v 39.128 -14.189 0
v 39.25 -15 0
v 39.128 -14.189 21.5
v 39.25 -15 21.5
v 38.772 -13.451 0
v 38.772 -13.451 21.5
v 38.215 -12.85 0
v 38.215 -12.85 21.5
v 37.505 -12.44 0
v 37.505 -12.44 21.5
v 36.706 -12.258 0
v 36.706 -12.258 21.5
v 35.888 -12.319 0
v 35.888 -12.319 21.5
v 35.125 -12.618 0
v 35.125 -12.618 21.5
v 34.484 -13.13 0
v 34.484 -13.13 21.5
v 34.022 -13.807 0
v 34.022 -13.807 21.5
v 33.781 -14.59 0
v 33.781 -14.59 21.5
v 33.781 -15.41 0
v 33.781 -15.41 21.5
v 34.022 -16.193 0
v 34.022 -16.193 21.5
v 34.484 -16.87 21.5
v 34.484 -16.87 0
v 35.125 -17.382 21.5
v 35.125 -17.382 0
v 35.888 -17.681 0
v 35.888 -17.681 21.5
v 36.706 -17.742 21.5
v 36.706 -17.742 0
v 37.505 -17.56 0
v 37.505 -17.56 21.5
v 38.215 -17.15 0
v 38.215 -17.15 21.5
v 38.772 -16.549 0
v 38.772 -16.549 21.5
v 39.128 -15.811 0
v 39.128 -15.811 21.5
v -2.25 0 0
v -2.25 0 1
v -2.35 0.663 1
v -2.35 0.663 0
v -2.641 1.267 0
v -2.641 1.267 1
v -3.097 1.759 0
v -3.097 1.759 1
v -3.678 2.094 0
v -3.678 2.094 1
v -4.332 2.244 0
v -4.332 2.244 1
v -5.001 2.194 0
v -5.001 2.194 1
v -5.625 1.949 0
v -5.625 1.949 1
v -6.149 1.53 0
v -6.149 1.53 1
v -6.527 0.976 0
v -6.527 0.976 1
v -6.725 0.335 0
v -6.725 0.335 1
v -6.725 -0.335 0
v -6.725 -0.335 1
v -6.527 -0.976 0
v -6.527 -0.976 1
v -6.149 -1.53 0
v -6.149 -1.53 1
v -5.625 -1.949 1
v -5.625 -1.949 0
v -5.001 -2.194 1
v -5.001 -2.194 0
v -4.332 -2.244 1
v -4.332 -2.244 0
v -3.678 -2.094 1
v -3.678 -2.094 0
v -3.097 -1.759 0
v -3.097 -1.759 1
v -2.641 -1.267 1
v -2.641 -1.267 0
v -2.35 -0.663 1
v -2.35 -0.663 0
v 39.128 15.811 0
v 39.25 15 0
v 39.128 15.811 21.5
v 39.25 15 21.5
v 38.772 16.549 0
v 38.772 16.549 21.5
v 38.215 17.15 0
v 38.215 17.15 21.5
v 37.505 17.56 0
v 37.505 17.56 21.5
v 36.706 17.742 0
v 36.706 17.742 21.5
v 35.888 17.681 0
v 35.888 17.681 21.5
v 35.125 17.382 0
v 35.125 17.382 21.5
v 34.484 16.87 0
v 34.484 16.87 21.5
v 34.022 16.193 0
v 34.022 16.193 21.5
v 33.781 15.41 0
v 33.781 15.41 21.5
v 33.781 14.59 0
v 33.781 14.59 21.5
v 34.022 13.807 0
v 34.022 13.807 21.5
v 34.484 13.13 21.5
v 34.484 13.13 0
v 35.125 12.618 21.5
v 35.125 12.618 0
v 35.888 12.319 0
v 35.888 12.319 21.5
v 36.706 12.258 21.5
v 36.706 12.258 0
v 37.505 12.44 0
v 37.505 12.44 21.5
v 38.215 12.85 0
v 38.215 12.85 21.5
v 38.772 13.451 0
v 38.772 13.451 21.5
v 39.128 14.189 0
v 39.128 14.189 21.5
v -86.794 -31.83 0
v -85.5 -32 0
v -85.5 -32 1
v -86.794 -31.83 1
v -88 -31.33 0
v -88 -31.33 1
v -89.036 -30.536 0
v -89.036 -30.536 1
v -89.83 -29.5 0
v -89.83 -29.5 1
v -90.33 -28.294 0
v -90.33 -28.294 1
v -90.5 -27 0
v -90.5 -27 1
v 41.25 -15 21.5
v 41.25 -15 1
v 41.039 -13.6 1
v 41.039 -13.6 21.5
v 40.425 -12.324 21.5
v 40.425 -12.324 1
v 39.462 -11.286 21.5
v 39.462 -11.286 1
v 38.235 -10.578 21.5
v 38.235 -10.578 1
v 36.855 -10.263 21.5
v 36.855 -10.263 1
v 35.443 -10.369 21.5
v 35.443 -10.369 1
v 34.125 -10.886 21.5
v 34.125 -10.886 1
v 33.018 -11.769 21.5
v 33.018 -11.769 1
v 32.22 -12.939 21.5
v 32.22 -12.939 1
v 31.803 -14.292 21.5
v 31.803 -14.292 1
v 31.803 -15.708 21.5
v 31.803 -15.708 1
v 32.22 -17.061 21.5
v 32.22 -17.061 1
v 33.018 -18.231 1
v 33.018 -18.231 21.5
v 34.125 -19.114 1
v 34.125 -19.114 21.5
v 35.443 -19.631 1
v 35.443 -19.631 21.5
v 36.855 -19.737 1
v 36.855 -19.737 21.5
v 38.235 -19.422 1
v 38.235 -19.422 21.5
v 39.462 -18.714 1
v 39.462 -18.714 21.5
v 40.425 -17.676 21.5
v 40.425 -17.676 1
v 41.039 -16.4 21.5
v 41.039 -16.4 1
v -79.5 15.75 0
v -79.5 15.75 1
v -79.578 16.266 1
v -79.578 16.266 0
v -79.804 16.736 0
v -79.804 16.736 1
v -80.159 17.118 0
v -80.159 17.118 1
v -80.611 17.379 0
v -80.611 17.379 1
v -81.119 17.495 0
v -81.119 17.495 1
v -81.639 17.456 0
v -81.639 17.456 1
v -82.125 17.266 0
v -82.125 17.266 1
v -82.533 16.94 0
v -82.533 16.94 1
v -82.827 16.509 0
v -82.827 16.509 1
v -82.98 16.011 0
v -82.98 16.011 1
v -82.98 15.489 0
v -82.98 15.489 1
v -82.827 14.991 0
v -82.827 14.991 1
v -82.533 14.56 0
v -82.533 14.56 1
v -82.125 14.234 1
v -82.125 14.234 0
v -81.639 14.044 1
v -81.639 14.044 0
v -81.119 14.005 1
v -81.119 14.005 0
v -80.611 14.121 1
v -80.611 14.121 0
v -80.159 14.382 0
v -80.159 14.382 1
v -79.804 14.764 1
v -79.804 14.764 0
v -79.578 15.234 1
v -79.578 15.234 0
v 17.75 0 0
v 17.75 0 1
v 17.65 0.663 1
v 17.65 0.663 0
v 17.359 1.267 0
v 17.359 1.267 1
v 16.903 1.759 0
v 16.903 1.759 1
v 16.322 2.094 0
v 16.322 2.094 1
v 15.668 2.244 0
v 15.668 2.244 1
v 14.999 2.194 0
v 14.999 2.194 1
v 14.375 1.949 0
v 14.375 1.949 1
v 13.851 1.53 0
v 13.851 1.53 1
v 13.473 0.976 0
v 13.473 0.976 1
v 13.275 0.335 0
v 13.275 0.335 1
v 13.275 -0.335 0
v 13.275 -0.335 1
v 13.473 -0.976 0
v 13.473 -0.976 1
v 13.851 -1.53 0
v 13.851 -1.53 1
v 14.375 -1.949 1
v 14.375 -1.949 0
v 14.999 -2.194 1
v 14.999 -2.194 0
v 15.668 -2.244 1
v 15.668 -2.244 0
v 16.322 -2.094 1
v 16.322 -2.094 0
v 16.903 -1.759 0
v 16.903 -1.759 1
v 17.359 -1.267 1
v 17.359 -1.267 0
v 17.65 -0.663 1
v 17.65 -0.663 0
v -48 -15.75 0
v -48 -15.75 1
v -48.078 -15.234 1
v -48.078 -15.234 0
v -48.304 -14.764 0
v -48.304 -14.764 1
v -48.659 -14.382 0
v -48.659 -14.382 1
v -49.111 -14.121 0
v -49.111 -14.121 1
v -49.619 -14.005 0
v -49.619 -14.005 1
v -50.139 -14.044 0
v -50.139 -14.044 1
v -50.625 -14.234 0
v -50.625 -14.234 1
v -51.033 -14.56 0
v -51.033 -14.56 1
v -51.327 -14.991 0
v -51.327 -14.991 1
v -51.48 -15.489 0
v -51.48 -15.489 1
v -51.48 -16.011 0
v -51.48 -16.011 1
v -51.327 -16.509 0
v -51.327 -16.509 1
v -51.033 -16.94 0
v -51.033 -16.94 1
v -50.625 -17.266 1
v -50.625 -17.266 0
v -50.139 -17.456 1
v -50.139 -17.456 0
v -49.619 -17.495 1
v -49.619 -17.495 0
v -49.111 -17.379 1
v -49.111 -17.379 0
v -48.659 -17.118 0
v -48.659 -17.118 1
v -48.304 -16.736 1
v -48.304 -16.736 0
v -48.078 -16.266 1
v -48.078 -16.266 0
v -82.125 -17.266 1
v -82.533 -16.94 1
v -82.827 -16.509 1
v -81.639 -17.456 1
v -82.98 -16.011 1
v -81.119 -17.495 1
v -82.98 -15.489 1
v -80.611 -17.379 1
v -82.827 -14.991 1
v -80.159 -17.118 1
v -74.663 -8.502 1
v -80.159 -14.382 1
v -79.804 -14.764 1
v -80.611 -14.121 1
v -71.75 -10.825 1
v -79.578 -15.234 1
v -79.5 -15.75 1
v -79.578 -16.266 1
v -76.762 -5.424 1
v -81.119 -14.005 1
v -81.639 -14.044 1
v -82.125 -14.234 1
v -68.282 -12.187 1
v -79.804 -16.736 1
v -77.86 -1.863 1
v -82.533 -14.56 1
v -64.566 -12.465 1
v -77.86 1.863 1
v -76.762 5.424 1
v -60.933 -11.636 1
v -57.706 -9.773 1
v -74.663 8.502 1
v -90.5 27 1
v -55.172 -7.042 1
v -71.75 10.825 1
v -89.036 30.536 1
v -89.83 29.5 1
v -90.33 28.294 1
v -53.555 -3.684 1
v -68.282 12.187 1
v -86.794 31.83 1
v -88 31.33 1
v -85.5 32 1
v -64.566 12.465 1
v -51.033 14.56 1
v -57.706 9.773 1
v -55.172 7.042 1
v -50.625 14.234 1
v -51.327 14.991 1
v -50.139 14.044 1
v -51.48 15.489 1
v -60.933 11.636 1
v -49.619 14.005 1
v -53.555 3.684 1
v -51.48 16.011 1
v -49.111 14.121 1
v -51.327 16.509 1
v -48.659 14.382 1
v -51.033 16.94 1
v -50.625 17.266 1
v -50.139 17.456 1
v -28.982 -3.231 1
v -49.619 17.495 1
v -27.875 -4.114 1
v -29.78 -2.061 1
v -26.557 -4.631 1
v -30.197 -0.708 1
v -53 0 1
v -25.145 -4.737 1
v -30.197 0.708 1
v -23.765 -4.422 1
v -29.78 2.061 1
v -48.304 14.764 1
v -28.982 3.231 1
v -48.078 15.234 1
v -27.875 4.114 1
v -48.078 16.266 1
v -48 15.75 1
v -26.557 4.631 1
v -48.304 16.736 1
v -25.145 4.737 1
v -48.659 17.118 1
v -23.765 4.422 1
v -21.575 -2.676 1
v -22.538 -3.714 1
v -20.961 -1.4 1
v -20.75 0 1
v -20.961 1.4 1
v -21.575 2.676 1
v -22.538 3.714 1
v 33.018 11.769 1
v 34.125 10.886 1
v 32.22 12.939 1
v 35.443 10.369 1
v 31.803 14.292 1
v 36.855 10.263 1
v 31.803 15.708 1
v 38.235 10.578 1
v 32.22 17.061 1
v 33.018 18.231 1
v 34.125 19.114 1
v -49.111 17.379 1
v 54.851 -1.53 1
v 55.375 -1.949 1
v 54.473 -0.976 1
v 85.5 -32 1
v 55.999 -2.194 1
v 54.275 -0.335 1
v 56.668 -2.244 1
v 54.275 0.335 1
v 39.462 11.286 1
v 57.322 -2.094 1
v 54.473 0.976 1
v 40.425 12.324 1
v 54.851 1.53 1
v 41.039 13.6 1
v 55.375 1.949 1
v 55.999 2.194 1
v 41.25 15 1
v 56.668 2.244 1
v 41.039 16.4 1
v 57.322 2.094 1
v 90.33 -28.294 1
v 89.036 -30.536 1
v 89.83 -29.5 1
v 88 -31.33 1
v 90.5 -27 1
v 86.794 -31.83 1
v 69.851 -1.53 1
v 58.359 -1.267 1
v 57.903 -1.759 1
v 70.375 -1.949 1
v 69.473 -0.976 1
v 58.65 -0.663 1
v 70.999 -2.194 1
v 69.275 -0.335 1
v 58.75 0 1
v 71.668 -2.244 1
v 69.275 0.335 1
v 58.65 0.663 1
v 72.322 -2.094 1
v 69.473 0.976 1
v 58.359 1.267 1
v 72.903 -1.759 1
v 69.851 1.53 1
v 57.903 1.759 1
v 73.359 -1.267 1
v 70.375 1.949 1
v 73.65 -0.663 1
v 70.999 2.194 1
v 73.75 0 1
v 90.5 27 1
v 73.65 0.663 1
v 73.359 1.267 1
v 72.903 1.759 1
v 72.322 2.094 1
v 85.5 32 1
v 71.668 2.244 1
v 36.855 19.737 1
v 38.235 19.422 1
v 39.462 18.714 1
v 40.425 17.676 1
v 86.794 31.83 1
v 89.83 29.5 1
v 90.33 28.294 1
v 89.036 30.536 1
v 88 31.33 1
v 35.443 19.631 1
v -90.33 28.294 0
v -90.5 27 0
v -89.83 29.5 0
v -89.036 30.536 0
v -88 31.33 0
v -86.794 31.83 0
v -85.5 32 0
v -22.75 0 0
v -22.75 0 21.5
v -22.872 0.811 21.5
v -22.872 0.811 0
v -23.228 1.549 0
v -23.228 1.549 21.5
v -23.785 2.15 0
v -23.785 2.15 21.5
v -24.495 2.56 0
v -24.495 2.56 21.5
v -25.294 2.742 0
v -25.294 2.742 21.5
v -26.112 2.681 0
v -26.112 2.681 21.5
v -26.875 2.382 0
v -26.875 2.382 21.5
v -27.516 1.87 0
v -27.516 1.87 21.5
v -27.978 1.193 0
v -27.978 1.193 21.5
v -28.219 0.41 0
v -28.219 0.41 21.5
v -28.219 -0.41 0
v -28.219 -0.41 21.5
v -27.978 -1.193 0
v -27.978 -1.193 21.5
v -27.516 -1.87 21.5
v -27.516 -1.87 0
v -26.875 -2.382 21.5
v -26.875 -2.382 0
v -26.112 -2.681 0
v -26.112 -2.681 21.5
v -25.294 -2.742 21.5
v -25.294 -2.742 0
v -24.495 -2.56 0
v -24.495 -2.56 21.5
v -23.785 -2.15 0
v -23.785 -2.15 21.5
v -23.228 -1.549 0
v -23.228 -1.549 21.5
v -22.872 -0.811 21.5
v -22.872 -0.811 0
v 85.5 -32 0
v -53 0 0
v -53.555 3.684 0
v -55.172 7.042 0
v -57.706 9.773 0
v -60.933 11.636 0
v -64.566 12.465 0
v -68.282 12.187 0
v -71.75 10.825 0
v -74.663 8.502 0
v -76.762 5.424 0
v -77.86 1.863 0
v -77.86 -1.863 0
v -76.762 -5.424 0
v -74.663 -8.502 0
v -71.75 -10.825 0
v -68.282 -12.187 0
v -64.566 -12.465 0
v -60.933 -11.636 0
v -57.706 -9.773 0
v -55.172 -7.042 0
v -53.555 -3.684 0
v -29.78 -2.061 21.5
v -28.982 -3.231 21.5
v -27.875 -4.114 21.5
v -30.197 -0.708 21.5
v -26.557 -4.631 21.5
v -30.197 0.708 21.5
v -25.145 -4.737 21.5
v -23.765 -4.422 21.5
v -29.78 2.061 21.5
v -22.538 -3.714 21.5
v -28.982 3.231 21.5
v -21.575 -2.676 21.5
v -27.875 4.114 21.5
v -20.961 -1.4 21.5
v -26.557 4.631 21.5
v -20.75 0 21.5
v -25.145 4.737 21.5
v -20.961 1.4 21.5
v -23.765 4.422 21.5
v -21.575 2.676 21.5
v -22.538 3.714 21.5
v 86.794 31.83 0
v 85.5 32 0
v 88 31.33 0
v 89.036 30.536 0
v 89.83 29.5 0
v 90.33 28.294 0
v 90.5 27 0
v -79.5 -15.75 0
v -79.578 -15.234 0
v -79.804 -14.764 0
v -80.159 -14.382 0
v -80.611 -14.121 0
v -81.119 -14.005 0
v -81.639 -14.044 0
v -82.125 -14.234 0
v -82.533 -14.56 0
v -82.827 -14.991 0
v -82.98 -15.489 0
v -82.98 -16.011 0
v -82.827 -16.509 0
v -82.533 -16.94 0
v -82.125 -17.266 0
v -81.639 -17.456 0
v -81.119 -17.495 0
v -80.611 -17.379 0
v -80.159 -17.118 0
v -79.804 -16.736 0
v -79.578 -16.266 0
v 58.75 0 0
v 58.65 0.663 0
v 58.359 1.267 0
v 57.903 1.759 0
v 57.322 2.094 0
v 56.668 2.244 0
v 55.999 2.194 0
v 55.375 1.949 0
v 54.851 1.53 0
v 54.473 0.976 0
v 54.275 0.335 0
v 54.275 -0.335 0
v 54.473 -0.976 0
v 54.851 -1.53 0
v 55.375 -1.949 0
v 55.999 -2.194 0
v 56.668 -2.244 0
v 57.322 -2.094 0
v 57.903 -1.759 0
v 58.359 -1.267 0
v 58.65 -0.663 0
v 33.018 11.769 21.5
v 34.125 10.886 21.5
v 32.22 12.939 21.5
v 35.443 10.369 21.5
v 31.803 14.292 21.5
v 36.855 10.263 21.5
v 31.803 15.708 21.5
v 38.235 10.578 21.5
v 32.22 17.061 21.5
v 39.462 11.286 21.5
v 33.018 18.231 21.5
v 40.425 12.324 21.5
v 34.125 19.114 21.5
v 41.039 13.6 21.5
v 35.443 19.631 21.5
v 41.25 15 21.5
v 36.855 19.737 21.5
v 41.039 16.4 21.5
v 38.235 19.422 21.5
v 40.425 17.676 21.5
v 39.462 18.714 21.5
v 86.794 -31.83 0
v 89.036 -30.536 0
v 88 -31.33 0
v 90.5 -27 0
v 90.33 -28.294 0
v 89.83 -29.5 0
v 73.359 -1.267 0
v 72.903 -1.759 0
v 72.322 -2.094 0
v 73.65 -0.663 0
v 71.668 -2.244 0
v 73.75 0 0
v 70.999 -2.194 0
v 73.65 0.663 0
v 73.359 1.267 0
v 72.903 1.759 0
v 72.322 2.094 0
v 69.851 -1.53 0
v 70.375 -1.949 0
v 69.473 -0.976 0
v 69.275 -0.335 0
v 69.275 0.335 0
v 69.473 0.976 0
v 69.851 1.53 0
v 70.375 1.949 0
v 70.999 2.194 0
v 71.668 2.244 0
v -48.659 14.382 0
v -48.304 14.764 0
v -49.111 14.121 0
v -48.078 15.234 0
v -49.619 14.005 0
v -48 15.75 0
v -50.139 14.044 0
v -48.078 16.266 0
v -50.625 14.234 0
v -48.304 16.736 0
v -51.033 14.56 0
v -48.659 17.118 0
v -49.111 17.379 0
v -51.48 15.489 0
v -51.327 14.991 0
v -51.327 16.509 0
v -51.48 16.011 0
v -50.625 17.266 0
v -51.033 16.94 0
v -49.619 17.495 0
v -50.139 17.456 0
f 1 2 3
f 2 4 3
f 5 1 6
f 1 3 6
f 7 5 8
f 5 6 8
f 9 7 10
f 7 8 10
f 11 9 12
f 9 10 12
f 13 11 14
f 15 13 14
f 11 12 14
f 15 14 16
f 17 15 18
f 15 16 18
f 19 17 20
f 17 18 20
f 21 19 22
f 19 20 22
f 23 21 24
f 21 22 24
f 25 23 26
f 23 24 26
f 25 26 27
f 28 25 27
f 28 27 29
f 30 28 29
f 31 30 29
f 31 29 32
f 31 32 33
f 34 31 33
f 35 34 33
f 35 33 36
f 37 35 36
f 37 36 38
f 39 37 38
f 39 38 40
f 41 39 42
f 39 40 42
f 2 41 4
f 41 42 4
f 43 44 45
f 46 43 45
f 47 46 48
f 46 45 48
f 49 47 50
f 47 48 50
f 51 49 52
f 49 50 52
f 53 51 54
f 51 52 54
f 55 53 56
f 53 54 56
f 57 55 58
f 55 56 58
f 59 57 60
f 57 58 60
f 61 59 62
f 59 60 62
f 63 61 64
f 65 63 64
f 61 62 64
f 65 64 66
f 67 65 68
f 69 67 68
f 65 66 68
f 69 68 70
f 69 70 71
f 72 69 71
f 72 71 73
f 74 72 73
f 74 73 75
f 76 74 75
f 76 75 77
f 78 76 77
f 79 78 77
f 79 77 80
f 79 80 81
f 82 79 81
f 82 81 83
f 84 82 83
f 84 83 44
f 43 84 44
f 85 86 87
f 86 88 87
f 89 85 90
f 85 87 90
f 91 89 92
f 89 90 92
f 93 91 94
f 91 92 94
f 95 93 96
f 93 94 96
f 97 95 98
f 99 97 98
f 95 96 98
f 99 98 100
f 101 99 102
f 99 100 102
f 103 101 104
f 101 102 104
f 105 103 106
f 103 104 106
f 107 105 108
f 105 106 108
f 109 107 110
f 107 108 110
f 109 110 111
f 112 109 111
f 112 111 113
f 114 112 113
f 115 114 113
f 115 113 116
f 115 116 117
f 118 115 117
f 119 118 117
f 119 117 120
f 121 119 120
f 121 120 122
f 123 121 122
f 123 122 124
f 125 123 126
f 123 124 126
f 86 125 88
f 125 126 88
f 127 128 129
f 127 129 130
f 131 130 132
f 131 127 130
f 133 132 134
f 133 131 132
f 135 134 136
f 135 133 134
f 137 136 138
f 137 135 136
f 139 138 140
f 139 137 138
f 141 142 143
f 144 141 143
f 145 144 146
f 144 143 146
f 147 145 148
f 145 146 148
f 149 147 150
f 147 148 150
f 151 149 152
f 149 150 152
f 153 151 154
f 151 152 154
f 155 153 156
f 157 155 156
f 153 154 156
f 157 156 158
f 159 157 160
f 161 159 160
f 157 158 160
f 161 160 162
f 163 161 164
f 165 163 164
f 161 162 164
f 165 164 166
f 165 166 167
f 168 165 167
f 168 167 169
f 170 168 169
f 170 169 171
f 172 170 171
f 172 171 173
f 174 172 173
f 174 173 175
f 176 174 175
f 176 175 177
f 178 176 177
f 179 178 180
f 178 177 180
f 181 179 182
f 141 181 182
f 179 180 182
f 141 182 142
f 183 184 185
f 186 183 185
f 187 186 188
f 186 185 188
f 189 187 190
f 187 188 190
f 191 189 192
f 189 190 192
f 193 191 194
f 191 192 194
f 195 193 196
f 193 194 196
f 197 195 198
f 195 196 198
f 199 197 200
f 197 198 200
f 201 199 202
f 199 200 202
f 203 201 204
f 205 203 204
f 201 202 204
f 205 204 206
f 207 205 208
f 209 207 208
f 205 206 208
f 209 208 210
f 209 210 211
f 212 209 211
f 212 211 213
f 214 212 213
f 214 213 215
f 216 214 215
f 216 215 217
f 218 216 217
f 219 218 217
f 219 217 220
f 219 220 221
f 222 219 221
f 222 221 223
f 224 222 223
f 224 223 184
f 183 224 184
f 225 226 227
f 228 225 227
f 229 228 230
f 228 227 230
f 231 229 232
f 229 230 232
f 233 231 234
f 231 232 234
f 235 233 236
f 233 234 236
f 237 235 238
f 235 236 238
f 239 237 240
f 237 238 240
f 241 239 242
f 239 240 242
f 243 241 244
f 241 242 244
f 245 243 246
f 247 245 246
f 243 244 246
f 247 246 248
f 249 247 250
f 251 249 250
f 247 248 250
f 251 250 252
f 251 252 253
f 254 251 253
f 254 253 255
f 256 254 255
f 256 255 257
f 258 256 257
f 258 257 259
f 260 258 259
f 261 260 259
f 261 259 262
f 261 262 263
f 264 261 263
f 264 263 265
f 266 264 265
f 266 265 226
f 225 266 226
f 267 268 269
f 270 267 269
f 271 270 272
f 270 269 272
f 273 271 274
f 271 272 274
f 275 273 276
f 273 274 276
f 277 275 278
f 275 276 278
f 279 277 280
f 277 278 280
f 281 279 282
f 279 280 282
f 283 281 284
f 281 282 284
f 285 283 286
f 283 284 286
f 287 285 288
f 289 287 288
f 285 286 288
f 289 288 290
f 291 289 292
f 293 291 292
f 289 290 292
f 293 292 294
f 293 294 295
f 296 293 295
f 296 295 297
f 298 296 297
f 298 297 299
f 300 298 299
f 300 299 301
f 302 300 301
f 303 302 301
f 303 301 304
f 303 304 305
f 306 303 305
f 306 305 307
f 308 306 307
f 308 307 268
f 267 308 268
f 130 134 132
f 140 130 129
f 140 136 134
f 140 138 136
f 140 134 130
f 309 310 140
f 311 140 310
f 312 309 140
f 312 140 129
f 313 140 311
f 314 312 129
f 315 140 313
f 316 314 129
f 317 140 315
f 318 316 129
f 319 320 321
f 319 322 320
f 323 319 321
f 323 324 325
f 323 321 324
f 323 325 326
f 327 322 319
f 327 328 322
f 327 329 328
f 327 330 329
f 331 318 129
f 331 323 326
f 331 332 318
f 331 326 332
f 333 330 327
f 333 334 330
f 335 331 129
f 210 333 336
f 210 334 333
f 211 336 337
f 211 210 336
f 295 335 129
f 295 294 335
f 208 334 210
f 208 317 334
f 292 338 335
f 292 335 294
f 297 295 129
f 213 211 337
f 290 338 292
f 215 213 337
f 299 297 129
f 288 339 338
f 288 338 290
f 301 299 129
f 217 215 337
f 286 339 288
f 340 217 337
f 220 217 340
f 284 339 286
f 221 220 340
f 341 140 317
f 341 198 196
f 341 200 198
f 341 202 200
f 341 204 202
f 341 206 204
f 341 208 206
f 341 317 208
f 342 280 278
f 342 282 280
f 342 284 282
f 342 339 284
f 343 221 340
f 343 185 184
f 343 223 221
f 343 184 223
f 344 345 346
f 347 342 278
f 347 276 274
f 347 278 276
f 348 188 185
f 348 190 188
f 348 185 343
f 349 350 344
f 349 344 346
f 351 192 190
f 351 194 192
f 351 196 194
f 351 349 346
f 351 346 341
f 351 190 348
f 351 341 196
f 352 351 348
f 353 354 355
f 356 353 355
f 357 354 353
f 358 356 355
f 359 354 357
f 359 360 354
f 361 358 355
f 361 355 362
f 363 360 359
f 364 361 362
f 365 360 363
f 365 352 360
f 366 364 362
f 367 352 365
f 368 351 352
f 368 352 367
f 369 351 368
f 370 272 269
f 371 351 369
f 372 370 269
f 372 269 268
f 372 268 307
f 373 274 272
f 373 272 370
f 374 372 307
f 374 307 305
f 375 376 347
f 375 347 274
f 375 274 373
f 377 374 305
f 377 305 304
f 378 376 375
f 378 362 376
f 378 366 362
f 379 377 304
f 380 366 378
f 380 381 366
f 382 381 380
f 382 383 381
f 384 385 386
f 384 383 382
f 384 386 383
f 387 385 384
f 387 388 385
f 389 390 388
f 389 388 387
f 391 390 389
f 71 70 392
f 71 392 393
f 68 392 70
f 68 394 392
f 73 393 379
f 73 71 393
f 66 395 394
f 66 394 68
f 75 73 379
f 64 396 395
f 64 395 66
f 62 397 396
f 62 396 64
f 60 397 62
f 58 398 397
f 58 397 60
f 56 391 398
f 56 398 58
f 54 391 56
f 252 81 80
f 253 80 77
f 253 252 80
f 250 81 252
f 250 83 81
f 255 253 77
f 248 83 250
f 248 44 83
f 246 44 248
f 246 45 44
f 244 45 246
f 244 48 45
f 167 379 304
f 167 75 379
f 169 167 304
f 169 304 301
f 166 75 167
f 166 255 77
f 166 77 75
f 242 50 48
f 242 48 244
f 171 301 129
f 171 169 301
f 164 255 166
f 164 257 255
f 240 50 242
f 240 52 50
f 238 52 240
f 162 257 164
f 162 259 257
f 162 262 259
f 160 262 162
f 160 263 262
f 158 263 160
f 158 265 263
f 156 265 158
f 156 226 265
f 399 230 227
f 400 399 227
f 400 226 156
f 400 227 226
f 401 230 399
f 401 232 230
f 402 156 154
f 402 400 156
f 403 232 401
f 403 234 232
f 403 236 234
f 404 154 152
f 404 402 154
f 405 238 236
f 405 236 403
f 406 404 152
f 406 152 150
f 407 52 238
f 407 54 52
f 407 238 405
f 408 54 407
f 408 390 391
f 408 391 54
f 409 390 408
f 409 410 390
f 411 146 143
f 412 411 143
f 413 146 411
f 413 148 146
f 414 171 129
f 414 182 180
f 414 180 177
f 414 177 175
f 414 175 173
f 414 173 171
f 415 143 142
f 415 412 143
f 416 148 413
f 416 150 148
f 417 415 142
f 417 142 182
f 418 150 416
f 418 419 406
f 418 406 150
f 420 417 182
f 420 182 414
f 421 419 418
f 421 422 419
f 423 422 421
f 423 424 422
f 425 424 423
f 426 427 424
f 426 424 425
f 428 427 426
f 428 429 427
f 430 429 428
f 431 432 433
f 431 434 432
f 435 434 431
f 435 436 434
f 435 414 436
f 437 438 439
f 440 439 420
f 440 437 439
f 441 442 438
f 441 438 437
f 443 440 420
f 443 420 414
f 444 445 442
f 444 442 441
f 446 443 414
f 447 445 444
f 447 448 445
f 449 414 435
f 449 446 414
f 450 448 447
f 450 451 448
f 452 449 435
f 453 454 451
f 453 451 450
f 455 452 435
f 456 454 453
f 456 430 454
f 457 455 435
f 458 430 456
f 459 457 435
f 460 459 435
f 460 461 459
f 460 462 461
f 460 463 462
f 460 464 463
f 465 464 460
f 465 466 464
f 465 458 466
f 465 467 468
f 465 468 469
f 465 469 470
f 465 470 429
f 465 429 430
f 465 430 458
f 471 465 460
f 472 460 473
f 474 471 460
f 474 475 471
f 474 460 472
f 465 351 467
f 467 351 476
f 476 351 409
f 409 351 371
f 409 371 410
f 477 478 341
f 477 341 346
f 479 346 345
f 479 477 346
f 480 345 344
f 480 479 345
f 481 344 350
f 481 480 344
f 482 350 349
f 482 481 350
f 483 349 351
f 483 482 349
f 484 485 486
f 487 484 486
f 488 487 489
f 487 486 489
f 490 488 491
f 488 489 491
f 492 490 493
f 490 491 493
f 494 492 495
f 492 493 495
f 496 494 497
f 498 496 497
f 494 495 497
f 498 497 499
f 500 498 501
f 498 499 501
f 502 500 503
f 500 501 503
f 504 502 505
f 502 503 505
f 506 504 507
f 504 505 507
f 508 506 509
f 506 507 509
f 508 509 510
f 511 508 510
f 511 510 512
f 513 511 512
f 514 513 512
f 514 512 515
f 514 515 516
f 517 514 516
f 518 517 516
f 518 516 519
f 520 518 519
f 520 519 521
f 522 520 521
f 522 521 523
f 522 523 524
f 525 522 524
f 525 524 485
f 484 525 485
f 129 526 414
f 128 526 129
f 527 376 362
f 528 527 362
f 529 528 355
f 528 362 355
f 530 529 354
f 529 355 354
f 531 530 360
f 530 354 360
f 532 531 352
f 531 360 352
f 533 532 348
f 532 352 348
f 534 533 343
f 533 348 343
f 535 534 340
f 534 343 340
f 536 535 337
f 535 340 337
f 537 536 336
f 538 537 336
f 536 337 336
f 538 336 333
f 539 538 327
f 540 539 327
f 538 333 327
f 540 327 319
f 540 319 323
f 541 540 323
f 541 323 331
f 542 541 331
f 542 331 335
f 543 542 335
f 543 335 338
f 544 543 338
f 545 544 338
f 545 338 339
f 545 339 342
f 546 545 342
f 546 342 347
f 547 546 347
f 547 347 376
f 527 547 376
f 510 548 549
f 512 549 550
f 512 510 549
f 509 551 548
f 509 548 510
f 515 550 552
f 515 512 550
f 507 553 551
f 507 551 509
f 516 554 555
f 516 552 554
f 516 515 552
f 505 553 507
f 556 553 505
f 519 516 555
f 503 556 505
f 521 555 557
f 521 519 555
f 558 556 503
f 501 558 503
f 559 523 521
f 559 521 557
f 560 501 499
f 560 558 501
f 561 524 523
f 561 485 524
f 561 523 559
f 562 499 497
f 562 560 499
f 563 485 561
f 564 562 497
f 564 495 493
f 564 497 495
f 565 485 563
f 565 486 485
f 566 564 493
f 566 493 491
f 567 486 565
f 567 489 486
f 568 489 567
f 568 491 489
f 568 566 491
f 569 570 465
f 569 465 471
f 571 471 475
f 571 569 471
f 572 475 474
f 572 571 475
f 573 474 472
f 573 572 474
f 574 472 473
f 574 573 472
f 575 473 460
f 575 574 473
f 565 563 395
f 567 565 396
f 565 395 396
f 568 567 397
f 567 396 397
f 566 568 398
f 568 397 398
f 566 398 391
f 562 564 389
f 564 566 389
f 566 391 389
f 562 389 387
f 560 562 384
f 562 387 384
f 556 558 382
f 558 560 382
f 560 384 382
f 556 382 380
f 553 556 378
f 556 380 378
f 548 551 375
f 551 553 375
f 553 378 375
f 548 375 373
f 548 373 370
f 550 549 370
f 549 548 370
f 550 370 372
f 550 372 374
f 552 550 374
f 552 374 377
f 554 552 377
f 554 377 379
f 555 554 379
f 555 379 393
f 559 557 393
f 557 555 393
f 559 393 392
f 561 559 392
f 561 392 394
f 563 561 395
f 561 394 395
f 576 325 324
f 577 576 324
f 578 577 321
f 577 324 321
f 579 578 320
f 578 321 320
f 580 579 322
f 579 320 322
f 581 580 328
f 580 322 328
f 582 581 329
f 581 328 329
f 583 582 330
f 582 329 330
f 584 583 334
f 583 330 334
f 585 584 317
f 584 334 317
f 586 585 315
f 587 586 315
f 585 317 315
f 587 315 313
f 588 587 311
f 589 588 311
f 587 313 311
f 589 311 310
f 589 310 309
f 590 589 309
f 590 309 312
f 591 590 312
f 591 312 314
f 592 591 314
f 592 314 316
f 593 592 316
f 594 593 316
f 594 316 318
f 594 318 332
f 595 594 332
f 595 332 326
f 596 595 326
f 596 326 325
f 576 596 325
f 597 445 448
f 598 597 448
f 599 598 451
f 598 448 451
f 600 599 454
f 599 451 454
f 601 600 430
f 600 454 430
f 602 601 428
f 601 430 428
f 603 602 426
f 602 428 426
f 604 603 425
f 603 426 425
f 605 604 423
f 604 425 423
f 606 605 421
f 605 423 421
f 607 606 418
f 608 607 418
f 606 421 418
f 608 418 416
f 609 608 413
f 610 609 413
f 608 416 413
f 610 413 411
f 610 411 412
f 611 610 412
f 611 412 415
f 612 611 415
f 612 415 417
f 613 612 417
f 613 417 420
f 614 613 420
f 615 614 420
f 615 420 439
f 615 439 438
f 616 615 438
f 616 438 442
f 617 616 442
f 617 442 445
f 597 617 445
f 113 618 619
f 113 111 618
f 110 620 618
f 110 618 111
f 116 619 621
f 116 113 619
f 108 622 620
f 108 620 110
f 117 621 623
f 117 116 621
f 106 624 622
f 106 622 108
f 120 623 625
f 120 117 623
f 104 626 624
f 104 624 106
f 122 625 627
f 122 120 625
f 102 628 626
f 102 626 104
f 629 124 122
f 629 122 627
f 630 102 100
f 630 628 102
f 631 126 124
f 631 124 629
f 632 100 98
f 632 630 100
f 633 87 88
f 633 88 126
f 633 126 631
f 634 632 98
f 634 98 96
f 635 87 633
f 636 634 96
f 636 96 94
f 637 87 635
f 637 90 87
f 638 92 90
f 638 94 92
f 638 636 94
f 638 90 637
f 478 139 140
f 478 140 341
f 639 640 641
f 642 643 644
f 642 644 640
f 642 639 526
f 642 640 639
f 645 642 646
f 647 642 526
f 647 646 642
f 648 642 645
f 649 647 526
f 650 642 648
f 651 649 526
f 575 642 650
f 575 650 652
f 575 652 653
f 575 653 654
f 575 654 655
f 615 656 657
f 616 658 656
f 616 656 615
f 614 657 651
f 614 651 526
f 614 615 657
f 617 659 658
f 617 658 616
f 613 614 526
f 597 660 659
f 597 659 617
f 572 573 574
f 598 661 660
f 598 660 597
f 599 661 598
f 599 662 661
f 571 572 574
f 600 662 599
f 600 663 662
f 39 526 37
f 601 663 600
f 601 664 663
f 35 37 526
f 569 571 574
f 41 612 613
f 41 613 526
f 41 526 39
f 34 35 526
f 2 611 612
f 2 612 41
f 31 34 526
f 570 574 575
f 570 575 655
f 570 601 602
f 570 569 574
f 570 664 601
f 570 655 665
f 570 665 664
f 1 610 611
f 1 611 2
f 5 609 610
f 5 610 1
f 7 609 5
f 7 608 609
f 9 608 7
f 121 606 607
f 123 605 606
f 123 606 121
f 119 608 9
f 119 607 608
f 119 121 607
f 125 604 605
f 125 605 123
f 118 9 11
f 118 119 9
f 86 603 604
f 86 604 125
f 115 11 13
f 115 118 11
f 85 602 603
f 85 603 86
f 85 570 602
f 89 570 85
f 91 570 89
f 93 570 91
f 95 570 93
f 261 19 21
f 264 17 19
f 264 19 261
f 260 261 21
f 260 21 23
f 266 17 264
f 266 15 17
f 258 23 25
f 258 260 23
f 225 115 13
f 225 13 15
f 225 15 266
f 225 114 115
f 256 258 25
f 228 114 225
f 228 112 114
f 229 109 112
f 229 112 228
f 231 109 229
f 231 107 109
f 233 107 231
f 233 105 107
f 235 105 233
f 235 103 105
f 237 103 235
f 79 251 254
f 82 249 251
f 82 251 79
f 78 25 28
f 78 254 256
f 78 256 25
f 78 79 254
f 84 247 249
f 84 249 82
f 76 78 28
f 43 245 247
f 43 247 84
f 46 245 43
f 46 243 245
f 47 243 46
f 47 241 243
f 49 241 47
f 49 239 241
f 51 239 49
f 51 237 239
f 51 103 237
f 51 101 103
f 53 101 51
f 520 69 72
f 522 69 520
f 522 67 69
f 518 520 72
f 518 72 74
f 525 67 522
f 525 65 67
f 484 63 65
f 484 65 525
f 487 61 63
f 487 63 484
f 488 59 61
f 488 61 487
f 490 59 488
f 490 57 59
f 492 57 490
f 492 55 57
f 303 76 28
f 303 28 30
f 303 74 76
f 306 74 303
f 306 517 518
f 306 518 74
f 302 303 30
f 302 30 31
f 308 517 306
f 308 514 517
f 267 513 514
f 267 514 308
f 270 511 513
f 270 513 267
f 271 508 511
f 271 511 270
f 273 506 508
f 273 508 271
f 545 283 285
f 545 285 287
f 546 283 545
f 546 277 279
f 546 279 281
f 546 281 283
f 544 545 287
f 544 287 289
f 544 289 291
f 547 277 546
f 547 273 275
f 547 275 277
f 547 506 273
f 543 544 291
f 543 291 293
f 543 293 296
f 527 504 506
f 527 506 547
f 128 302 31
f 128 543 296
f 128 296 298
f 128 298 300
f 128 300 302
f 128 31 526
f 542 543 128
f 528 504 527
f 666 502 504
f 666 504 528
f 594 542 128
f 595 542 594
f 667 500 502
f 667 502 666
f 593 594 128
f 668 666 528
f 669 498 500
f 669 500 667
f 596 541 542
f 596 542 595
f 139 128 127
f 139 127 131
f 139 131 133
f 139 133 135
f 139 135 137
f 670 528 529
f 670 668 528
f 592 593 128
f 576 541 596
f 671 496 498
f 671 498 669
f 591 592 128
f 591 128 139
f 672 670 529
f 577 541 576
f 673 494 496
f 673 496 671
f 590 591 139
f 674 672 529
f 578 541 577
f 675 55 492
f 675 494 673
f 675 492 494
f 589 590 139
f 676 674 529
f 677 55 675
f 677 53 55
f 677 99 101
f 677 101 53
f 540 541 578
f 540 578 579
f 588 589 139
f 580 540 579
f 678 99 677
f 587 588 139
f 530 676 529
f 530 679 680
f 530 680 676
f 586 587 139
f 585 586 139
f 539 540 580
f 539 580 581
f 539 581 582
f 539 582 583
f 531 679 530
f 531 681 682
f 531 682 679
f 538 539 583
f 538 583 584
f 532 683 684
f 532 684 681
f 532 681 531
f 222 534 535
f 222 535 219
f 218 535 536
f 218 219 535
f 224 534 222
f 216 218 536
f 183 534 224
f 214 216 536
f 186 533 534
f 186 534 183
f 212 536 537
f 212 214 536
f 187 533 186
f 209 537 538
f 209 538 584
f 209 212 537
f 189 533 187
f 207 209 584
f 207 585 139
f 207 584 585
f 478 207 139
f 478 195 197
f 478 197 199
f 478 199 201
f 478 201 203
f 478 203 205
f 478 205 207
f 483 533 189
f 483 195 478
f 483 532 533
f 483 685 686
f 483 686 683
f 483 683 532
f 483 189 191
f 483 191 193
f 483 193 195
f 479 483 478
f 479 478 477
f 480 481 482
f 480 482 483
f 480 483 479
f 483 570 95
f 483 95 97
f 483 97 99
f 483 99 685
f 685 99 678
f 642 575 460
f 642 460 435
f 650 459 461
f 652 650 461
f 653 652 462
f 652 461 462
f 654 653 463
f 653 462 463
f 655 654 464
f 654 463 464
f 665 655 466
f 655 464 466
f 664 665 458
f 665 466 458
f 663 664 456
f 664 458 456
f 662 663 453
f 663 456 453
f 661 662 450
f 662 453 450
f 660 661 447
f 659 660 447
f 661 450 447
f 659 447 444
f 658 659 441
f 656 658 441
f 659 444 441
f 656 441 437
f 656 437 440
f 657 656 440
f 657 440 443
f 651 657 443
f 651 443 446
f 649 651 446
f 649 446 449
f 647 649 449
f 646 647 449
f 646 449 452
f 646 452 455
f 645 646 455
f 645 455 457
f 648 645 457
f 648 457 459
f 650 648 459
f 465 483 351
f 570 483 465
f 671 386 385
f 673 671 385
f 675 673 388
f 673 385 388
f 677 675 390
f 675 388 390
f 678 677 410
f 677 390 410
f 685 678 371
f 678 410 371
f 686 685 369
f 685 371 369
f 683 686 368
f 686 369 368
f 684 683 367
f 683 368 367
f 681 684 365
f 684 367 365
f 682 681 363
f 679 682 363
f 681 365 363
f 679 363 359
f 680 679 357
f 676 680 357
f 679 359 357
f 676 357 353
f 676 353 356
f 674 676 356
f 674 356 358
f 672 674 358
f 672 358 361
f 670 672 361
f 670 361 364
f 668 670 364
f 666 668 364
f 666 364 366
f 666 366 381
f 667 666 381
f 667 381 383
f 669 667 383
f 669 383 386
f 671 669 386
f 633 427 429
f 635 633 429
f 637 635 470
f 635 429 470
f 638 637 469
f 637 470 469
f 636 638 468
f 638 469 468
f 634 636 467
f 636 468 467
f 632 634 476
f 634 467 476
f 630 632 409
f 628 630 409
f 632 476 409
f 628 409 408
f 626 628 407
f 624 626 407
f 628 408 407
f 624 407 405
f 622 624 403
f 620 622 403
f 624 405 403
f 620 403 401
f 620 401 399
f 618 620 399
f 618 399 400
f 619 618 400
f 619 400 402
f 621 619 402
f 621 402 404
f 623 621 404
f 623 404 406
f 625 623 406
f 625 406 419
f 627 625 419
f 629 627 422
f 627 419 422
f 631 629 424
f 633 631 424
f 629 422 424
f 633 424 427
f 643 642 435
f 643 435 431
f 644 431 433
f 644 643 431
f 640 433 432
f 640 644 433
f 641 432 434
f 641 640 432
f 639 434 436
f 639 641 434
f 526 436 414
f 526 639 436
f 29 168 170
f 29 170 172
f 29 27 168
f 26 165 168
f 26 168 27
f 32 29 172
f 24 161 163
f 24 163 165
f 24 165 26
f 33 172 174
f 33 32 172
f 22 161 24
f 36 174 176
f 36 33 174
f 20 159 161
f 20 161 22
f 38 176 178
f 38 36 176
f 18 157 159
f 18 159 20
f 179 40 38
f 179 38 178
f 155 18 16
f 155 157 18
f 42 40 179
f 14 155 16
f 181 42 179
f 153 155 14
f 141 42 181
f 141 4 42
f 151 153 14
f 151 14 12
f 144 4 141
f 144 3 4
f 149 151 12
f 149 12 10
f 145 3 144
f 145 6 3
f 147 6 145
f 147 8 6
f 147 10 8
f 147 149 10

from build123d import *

# Parameters (mm, degrees)
BOSS_EXTRUDE1_DEPTH = 37
SKETCH2_R           = 1.75
SKETCH2_R_2         = 12.5
SKETCH2_R_3         = 2.75
SKETCH2_R_4         = 2.25
CUT_EXTRUDE1_DEPTH  = 38
SKETCH5_R           = 2.25
CUT_EXTRUDE2_DEPTH  = 38
CUT_EXTRUDE3_DEPTH  = 36
SKETCH7_R           = 4.75
BOSS_EXTRUDE2_DEPTH = 20.5
SKETCH10_W          = 40
SKETCH10_H          = 64
CUT_EXTRUDE4_DEPTH  = 36
SKETCH11_R          = 2.75
CUT_EXTRUDE5_DEPTH  = 22.5
SKETCH12_W          = 15
SKETCH12_H          = 10
SKETCH12_W_2        = 20
SKETCH12_W_3        = 10
BOSS_EXTRUDE3_DEPTH = 36
CUT_EXTRUDE6_DEPTH  = 33
CUT_EXTRUDE8_DEPTH  = 15
CUT_EXTRUDE9_DEPTH  = 15
CUT_EXTRUDE10_DEPTH = 10
CUT_EXTRUDE11_DEPTH = 10
SKETCH20_W          = 6
SKETCH20_H          = 15
CUT_EXTRUDE12_DEPTH = 3
SKETCH21_W          = 76
SKETCH21_H          = 64
SKETCH21_W_2        = 9.5
SKETCH21_H_2        = 9.5
SKETCH21_W_3        = 65
CUT_EXTRUDE13_DEPTH = 36


with BuildPart() as part:
    # Sketch1 → Boss-Extrude1 (new body)
    with BuildSketch(Plane.XY):
        with BuildLine():
            Line((-85.5, 32), (85.5, 32))
            ThreePointArc((85.5, 32), (89.035533906, 30.535533906), (90.5, 27))
            Line((90.5, 27), (90.5, -27))
            ThreePointArc((90.5, -27), (89.035533906, -30.535533906), (85.5, -32))
            Line((85.5, -32), (-85.5, -32))
            ThreePointArc((-85.5, -32), (-89.035533906, -30.535533906), (-90.5, -27))
            Line((-90.5, -27), (-90.5, 27))
            ThreePointArc((-90.5, 27), (-89.035533906, 30.535533906), (-85.5, 32))
        make_face()
    extrude(amount=BOSS_EXTRUDE1_DEPTH)

    # Sketch2 → Cut-Extrude1 (cut, through all)
    with BuildSketch(Plane.XY.offset(37)):
        with Locations((-81.25, 15.75)):
            Circle(SKETCH2_R)
        with Locations((-49.75, 15.75)):
            Circle(SKETCH2_R)
        with Locations((-81.25, -15.75)):
            Circle(SKETCH2_R)
        with Locations((-49.75, -15.75)):
            Circle(SKETCH2_R)
        with Locations((-65.5, 0)):
            Circle(SKETCH2_R_2)
        with Locations((36.5, 15)):
            Circle(SKETCH2_R_3)
        with Locations((36.5, -15)):
            Circle(SKETCH2_R_3)
        with Locations((-25.5, 0)):
            Circle(SKETCH2_R_3)
        with Locations((56.5, 0)):
            Circle(SKETCH2_R_4)
        with Locations((71.5, 0)):
            Circle(SKETCH2_R_4)
    extrude(amount=-CUT_EXTRUDE1_DEPTH, mode=Mode.SUBTRACT)

    # Sketch5 → Cut-Extrude2 (cut, through all)
    with BuildSketch(Plane.XY.offset(37)):
        with Locations((-4.5, 0)):
            Circle(SKETCH5_R)
        with Locations((15.5, 0)):
            Circle(SKETCH5_R)
    extrude(amount=-CUT_EXTRUDE2_DEPTH, mode=Mode.SUBTRACT)

    # Sketch6 → Cut-Extrude3 (cut)
    with BuildSketch(Plane.XY.offset(37)):
        with BuildLine():
            Line((-85.5, -29), (85.5, -29))
            ThreePointArc((85.5, -29), (86.914213562, -28.414213562), (87.5, -27))
            Line((87.5, -27), (87.5, 27))
            ThreePointArc((87.5, 27), (86.914213562, 28.414213562), (85.5, 29))
            Line((85.5, 29), (-85.5, 29))
            ThreePointArc((-85.5, 29), (-86.914213562, 28.414213562), (-87.5, 27))
            Line((-87.5, 27), (-87.5, -27))
            ThreePointArc((-87.5, -27), (-86.914213562, -28.414213562), (-85.5, -29))
        make_face()
    extrude(amount=-CUT_EXTRUDE3_DEPTH, mode=Mode.SUBTRACT)

    # Sketch7 → Boss-Extrude2 (add)
    with BuildSketch(Plane.XY.offset(1)):
        with Locations((-25.5, 0)):
            Circle(SKETCH7_R)
        with Locations((36.5, -15)):
            Circle(SKETCH7_R)
        with Locations((36.5, 15)):
            Circle(SKETCH7_R)
    extrude(amount=BOSS_EXTRUDE2_DEPTH)

    # Sketch10 → Cut-Extrude4 (cut)
    with BuildSketch(Plane.XY.offset(37)):
        with Locations((5.5, 0)):
            Rectangle(SKETCH10_W, SKETCH10_H)
    extrude(amount=-CUT_EXTRUDE4_DEPTH, mode=Mode.SUBTRACT)

    # Sketch11 → Cut-Extrude5 (cut, through all)
    with BuildSketch(Plane.XY.offset(21.5)):
        with Locations((36.5, -15)):
            Circle(SKETCH11_R)
        with Locations((-25.5, 0)):
            Circle(SKETCH11_R)
        with Locations((36.5, 15)):
            Circle(SKETCH11_R)
    extrude(amount=-CUT_EXTRUDE5_DEPTH, mode=Mode.SUBTRACT)

    # Sketch12 → Boss-Extrude3 (add, through all)
    with BuildSketch(Plane.XY.offset(1)):
        with Locations((75, -24)):
            Rectangle(SKETCH12_W, SKETCH12_H)
        with Locations((75, 24)):
            Rectangle(SKETCH12_W, SKETCH12_H)
        with Locations((77.5, -11)):
            Rectangle(SKETCH12_W_2, SKETCH12_H)
        with Locations((77.5, 11)):
            Rectangle(SKETCH12_W_2, SKETCH12_H)
        with Locations((-37.5, -24)):
            Rectangle(SKETCH12_W_3, SKETCH12_H)
        with Locations((-37.5, 24)):
            Rectangle(SKETCH12_W_3, SKETCH12_H)
    extrude(amount=BOSS_EXTRUDE3_DEPTH)

    # Sketch14 → Cut-Extrude6 (cut)
    with BuildSketch(Plane.XZ.offset(16)):
        Polygon((87.5, 37), (67.5, 37), (67.5, 3), align=None)
    extrude(amount=-CUT_EXTRUDE6_DEPTH, mode=Mode.SUBTRACT)

    # Sketch16 → Cut-Extrude8 (cut)
    with BuildSketch(Plane(origin=(82.5, 0, 0), x_dir=(0, 0, -1), z_dir=(1, 0, 0))):
        Polygon((-37, -19), (-3, -19), (-37, -29), align=None)
    extrude(amount=-CUT_EXTRUDE8_DEPTH, mode=Mode.SUBTRACT)

    # Sketch17 → Cut-Extrude9 (cut)
    with BuildSketch(Plane.ZY.offset(-67.5)):
        Polygon((37, 19), (1, 19), (37, 29), align=None)
    extrude(amount=-CUT_EXTRUDE9_DEPTH, mode=Mode.SUBTRACT)

    # Sketch18 → Cut-Extrude10 (cut)
    with BuildSketch(Plane(origin=(-32.5, 0, 0), x_dir=(0, 0, -1), z_dir=(1, 0, 0))):
        Polygon((-37, -29), (-37, -19), (-1, -19), align=None)
    extrude(amount=-CUT_EXTRUDE10_DEPTH, mode=Mode.SUBTRACT)

    # Sketch19 → Cut-Extrude11 (cut)
    with BuildSketch(Plane(origin=(-32.5, 0, 0), x_dir=(0, 0, -1), z_dir=(1, 0, 0))):
        Polygon((-37, 29), (-1, 19), (-37, 19), align=None)
    extrude(amount=-CUT_EXTRUDE11_DEPTH, mode=Mode.SUBTRACT)

    # Sketch20 → Cut-Extrude12 (cut)
    with BuildSketch(Plane.ZY.offset(90.5)):
        with Locations((30, 0)):
            Rectangle(SKETCH20_W, SKETCH20_H)
    extrude(amount=-CUT_EXTRUDE12_DEPTH, mode=Mode.SUBTRACT)

    # Sketch21 → Cut-Extrude13 (cut)
    with BuildSketch(Plane.XY.offset(37)):
        with Locations((-52.5, 0)):
            Rectangle(SKETCH21_W, SKETCH21_H)
        with Locations((-25.5, 0)):
            Rectangle(SKETCH21_W_2, SKETCH21_H_2, mode=Mode.SUBTRACT)
        with Locations((58, 0)):
            Rectangle(SKETCH21_W_3, SKETCH21_H)
        with Locations((36.5, -15)):
            Rectangle(SKETCH21_W_2, SKETCH21_H_2, mode=Mode.SUBTRACT)
        with Locations((36.5, 15)):
            Rectangle(SKETCH21_W_2, SKETCH21_H_2, mode=Mode.SUBTRACT)
    extrude(amount=-CUT_EXTRUDE13_DEPTH, mode=Mode.SUBTRACT)


solid = part.part
